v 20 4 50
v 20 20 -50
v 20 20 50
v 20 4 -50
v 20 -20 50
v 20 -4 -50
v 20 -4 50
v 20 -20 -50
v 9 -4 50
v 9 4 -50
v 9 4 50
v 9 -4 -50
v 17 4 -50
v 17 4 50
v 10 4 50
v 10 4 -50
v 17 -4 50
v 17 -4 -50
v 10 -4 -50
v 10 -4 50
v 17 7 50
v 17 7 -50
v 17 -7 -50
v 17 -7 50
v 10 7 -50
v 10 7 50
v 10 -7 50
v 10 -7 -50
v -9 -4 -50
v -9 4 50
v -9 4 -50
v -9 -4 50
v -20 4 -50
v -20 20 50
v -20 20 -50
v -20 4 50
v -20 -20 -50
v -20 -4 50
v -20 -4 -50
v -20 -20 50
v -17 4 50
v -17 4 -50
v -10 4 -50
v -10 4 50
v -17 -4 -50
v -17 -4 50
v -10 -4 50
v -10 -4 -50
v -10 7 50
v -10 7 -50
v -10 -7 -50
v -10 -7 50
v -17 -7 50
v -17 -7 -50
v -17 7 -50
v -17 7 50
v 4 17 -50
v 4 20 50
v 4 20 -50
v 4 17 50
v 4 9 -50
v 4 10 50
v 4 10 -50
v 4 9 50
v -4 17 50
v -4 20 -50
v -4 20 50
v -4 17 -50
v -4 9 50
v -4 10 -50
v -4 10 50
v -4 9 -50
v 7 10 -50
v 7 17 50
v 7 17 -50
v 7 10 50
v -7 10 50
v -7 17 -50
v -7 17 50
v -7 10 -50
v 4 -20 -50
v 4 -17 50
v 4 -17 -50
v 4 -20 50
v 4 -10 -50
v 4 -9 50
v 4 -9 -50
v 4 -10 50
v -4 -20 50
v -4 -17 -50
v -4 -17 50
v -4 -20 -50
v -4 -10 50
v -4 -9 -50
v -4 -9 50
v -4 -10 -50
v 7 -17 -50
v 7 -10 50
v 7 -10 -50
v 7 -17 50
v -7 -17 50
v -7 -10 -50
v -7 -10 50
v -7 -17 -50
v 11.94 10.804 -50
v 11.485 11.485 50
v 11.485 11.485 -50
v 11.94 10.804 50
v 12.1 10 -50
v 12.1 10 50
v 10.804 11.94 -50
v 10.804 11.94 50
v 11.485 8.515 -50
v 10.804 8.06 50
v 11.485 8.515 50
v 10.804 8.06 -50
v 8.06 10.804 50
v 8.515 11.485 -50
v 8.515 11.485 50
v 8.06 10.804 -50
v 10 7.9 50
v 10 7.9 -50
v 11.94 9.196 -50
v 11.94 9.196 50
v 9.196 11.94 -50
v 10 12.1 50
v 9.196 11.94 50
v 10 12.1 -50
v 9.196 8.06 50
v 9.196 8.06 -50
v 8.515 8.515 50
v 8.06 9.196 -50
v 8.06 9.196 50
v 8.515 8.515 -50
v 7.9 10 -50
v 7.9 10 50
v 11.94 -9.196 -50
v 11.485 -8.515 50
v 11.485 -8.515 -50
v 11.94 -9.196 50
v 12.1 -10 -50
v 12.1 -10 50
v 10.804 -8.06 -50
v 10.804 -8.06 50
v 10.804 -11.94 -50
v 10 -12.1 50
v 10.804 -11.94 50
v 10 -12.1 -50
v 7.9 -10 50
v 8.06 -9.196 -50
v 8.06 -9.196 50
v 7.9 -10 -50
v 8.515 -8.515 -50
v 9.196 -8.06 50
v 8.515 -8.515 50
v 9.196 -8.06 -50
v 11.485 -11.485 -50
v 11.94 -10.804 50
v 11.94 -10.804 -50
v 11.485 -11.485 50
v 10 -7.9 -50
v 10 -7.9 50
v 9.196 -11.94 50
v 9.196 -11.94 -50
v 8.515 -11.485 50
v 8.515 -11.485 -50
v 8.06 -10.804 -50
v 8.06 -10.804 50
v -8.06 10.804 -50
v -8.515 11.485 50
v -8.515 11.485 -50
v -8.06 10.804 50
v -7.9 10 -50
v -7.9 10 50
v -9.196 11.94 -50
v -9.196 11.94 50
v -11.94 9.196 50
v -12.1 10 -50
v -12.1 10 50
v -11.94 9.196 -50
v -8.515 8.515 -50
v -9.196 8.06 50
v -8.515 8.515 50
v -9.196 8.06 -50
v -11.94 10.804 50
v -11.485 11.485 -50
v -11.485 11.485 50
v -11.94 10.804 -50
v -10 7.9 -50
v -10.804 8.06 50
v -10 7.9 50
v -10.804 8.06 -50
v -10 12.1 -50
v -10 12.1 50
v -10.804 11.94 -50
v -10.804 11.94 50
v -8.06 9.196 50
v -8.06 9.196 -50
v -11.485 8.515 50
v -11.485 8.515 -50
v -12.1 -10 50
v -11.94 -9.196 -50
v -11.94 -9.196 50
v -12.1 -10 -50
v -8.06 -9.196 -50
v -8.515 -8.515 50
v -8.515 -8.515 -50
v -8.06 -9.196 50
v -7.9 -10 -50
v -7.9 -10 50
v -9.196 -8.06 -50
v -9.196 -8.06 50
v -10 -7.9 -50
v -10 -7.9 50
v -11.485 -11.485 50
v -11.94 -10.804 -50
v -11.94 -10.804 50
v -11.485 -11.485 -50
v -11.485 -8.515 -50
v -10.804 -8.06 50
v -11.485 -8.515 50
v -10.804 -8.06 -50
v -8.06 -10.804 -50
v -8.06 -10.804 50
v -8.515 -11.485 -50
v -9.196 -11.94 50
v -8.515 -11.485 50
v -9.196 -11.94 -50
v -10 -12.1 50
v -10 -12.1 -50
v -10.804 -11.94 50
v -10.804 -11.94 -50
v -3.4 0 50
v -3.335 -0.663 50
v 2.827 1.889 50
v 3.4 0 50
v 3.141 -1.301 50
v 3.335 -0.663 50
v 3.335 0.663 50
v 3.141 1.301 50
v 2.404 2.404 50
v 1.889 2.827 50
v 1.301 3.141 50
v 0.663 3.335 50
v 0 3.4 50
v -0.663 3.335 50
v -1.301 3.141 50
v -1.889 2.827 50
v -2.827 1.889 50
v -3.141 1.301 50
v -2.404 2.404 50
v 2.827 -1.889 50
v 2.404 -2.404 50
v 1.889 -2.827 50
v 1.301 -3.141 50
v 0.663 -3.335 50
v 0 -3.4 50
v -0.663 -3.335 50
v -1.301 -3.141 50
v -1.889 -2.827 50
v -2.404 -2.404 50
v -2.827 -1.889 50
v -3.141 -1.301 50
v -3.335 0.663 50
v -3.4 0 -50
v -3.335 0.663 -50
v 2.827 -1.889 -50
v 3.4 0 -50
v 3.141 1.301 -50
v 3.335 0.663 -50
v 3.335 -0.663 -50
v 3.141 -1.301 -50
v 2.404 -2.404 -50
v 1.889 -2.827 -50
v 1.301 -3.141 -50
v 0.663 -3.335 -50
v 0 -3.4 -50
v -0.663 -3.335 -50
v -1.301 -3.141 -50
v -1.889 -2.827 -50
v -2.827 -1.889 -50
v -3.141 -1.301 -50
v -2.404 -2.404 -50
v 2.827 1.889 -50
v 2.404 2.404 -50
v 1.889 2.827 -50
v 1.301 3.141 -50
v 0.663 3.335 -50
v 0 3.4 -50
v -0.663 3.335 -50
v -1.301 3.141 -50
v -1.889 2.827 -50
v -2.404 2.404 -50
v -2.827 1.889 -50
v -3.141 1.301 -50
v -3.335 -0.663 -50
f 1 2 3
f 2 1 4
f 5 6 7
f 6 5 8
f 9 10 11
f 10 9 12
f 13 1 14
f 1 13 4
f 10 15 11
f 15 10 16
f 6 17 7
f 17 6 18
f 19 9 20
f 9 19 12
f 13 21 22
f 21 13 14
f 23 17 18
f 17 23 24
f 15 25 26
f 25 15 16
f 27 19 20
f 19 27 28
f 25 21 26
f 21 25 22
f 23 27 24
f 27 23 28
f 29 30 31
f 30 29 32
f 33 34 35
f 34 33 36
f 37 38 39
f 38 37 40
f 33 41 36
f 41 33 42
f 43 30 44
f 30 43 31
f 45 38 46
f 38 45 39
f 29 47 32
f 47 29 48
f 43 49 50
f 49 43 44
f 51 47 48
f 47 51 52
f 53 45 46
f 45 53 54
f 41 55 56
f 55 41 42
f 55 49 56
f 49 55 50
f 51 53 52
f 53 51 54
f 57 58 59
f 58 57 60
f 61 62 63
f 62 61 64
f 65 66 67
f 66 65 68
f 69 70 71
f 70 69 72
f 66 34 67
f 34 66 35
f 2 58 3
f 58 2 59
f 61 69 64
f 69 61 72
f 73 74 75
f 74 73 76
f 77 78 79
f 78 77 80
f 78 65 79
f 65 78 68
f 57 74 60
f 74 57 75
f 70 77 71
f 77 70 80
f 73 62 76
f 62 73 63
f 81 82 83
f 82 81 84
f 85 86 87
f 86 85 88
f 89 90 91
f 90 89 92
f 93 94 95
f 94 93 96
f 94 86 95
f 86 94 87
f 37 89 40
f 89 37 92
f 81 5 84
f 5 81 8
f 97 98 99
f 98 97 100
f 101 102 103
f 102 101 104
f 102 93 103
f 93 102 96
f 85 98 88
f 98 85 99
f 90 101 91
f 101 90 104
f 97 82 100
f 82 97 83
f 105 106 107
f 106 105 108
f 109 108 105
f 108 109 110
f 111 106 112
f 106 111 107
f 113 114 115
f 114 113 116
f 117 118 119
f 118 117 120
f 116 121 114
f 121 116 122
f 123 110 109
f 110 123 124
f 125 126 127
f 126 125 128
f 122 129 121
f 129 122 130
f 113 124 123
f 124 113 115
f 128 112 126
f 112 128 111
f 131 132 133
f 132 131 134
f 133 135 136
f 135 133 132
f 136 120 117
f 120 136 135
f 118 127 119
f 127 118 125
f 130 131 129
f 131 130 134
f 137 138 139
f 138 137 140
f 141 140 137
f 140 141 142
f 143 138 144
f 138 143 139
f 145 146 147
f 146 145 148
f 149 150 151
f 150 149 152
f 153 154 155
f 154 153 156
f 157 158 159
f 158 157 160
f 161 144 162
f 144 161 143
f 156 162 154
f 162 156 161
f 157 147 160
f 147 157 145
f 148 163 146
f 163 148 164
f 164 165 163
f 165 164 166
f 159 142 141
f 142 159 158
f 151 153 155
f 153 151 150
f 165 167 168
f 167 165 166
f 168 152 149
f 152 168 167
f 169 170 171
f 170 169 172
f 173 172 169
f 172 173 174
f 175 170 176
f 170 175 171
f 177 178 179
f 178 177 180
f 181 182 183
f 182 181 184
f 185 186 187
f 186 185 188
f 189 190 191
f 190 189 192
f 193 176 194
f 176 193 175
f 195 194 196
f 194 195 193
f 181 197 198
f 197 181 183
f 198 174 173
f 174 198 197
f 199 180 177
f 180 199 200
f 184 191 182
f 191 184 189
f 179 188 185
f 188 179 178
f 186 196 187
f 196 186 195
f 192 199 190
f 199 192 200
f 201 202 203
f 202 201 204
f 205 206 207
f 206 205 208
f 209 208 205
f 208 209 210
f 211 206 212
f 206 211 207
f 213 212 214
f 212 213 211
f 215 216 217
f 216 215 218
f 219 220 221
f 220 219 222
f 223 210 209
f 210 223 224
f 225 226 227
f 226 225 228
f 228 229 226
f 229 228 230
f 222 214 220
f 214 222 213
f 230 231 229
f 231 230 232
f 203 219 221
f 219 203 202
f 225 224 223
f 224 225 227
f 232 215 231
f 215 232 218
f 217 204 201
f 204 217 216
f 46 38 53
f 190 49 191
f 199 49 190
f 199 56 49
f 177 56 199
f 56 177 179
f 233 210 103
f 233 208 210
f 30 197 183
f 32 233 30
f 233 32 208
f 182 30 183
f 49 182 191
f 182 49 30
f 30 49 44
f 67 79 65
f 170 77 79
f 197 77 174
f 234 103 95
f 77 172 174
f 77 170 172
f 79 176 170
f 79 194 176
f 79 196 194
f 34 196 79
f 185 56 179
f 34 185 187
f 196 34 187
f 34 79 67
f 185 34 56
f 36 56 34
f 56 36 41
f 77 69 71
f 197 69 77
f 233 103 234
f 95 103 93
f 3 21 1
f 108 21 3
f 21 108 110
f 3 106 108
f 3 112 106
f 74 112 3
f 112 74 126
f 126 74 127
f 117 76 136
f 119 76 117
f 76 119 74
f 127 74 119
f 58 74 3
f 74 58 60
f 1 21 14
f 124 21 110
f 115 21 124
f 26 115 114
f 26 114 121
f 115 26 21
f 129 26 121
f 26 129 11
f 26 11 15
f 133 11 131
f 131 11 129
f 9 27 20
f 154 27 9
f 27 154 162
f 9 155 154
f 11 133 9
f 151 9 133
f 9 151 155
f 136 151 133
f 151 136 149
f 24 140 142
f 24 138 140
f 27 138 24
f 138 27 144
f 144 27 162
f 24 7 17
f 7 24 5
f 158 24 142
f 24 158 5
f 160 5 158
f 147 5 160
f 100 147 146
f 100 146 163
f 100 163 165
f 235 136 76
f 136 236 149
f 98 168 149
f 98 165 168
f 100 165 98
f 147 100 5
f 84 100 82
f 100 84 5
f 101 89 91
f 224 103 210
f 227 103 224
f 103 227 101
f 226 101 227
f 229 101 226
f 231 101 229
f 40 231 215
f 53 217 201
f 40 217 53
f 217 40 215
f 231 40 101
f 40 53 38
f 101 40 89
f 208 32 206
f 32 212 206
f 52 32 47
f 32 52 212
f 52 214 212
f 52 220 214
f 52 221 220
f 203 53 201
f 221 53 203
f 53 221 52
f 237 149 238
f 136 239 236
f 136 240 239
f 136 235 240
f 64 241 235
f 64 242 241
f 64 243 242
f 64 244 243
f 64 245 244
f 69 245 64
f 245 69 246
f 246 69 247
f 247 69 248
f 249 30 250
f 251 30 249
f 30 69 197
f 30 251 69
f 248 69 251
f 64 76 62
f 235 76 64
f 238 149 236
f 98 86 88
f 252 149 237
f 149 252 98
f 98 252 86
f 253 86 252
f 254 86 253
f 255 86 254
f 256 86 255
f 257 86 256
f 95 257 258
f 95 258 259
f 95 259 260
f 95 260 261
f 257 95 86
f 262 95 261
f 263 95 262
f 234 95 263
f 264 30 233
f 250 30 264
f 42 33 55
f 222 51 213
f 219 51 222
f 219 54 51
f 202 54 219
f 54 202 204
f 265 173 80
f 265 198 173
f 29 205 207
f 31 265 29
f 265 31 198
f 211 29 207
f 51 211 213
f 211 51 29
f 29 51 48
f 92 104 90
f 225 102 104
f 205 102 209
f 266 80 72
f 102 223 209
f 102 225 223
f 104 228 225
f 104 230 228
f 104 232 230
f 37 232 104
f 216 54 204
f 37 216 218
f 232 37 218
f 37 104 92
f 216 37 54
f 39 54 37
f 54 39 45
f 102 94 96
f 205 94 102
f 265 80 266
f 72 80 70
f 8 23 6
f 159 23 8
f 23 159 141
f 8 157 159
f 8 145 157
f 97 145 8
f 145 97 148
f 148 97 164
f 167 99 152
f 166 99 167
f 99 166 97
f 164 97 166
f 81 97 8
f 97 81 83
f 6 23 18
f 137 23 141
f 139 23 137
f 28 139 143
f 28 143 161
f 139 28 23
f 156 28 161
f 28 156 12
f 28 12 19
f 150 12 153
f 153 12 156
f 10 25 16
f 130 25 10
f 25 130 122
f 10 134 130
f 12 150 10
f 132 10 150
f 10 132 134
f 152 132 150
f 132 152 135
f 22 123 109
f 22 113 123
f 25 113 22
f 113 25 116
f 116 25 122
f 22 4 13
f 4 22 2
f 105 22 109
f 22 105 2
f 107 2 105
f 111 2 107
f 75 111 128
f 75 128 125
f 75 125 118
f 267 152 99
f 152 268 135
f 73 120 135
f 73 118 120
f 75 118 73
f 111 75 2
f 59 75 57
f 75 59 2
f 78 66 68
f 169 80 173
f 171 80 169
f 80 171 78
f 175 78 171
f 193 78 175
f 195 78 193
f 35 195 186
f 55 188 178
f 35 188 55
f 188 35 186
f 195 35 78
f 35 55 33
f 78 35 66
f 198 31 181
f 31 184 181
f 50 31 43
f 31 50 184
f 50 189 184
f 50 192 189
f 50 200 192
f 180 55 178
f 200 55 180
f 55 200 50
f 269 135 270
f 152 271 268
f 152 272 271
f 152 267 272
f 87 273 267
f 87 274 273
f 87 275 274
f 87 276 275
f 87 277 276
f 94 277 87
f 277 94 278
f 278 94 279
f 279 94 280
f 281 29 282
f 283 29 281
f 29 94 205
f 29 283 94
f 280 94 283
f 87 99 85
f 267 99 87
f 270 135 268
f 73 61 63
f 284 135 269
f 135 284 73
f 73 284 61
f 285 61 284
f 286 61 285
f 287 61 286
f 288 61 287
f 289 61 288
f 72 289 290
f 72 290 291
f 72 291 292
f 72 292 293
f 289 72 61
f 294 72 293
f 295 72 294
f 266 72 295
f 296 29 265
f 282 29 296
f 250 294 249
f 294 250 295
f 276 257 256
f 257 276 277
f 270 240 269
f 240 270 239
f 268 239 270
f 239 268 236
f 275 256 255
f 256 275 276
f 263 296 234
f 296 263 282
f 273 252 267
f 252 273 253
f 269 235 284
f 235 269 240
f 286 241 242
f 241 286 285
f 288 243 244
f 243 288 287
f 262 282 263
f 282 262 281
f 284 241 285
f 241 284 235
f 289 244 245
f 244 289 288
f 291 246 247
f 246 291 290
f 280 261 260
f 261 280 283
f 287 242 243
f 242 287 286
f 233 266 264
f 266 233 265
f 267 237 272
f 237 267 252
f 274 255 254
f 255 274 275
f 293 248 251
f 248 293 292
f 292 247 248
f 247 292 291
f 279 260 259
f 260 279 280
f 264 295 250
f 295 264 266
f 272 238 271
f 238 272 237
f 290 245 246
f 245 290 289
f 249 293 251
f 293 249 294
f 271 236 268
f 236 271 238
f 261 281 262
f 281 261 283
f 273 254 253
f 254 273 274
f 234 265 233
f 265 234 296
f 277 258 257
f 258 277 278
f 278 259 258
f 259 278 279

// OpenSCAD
// Parameters
cross_section_width_mm = 40; //[20:80:1]
cross_section_height_mm = 40; //[20:80:1]
length_mm = 100; //[50:200:1]
center = 1; //[0:1:1]
cornerHole = 1; //[0:1:1]
outer_wall_mm = 2.5; //[1.5:5:0.1]
slot_opening_mm = 8; //[5:12:0.5]
slot_depth_mm = 10; //[6:16:0.5]
slot_cavity_width_mm = 14; //[10:20:0.5]
slot_cavity_depth_mm = 6; //[3:10:0.5]
center_bore_d_mm = 6.8; //[4:12:0.1]
corner_hole_d_mm = 4.2; //[2:8:0.1]
corner_hole_offset_mm = 10; //[6:16:0.5]
corner_feature_size_mm = 6; //[3:12:0.5]
overlap_mm = 1; //[0.5:2:0.1]

// E4040 Extrusion - complete geometry
module extrusion() {
  color("Silver") {
    difference() {
      // Main body
      cube([cross_section_width_mm, cross_section_height_mm, length_mm], center=true);
      
      // Center bore
      translate([0, 0, 0])
        cylinder(r=center_bore_d_mm/2, h=length_mm + 2*overlap_mm, center=true, $fn=32);
      
      // T-slot channels
      union() {
        // X-axis slots
        translate([cross_section_width_mm/2 - (slot_depth_mm + overlap_mm)/2, 0, 0])
          cube([slot_depth_mm + overlap_mm, slot_opening_mm, length_mm + 2*overlap_mm], center=true);
        translate([cross_section_width_mm/2 - slot_depth_mm + (slot_cavity_depth_mm + overlap_mm)/2, 0, 0])
          cube([slot_cavity_depth_mm + overlap_mm, slot_cavity_width_mm, length_mm + 2*overlap_mm], center=true);
        translate([-(cross_section_width_mm/2 - (slot_depth_mm + overlap_mm)/2), 0, 0])
          cube([slot_depth_mm + overlap_mm, slot_opening_mm, length_mm + 2*overlap_mm], center=true);
        translate([-(cross_section_width_mm/2 - slot_depth_mm + (slot_cavity_depth_mm + overlap_mm)/2), 0, 0])
          cube([slot_cavity_depth_mm + overlap_mm, slot_cavity_width_mm, length_mm + 2*overlap_mm], center=true);
        
        // Y-axis slots
        translate([0, cross_section_height_mm/2 - (slot_depth_mm + overlap_mm)/2, 0])
          cube([slot_opening_mm, slot_depth_mm + overlap_mm, length_mm + 2*overlap_mm], center=true);
        translate([0, cross_section_height_mm/2 - slot_depth_mm + (slot_cavity_depth_mm + overlap_mm)/2, 0])
          cube([slot_cavity_width_mm, slot_cavity_depth_mm + overlap_mm, length_mm + 2*overlap_mm], center=true);
        translate([0, -(cross_section_height_mm/2 - (slot_depth_mm + overlap_mm)/2), 0])
          cube([slot_opening_mm, slot_depth_mm + overlap_mm, length_mm + 2*overlap_mm], center=true);
        translate([0, -(cross_section_height_mm/2 - slot_depth_mm + (slot_cavity_depth_mm + overlap_mm)/2), 0])
          cube([slot_cavity_width_mm, slot_cavity_depth_mm + overlap_mm, length_mm + 2*overlap_mm], center=true);
      }
      
      // Corner holes
      if (cornerHole) {
        union() {
          translate([cross_section_width_mm/2 - corner_hole_offset_mm, cross_section_height_mm/2 - corner_hole_offset_mm, 0])
            cylinder(r=corner_hole_d_mm/2, h=length_mm + 2*overlap_mm, center=true, $fn=16);
          translate([cross_section_width_mm/2 - corner_hole_offset_mm, -(cross_section_height_mm/2 - corner_hole_offset_mm), 0])
            cylinder(r=corner_hole_d_mm/2, h=length_mm + 2*overlap_mm, center=true, $fn=16);
          translate([-(cross_section_width_mm/2 - corner_hole_offset_mm), cross_section_height_mm/2 - corner_hole_offset_mm, 0])
            cylinder(r=corner_hole_d_mm/2, h=length_mm + 2*overlap_mm, center=true, $fn=16);
          translate([-(cross_section_width_mm/2 - corner_hole_offset_mm), -(cross_section_height_mm/2 - corner_hole_offset_mm), 0])
            cylinder(r=corner_hole_d_mm/2, h=length_mm + 2*overlap_mm, center=true, $fn=16);
        }
      }
    }
  }
}

// Box Corner Profile Sections - complete geometry
module box_corner_profile_sections() {
  color("DimGray") {
    union() {
      box_corner_profile_section([cross_section_width_mm/2 - corner_feature_size_mm/2 - overlap_mm, cross_section_height_mm/2 - corner_feature_size_mm/2 - overlap_mm, 0]);
      box_corner_profile_section([cross_section_width_mm/2 - corner_feature_size_mm/2 - overlap_mm, -(cross_section_height_mm/2 - corner_feature_size_mm/2 - overlap_mm), 0]);
      box_corner_profile_section([-(cross_section_width_mm/2 - corner_feature_size_mm/2 - overlap_mm), cross_section_height_mm/2 - corner_feature_size_mm/2 - overlap_mm, 0]);
      box_corner_profile_section([-(cross_section_width_mm/2 - corner_feature_size_mm/2 - overlap_mm), -(cross_section_height_mm/2 - corner_feature_size_mm/2 - overlap_mm), 0]);
    }
  }
}

// Box Corner Profile Section - complete geometry
module box_corner_profile_section(position) {
  translate(position)
    cube([corner_feature_size_mm, corner_feature_size_mm, length_mm], center=true);
}

// Assembly
module assembly() {
  extrusion();
  box_corner_profile_sections();
}

assembly();
